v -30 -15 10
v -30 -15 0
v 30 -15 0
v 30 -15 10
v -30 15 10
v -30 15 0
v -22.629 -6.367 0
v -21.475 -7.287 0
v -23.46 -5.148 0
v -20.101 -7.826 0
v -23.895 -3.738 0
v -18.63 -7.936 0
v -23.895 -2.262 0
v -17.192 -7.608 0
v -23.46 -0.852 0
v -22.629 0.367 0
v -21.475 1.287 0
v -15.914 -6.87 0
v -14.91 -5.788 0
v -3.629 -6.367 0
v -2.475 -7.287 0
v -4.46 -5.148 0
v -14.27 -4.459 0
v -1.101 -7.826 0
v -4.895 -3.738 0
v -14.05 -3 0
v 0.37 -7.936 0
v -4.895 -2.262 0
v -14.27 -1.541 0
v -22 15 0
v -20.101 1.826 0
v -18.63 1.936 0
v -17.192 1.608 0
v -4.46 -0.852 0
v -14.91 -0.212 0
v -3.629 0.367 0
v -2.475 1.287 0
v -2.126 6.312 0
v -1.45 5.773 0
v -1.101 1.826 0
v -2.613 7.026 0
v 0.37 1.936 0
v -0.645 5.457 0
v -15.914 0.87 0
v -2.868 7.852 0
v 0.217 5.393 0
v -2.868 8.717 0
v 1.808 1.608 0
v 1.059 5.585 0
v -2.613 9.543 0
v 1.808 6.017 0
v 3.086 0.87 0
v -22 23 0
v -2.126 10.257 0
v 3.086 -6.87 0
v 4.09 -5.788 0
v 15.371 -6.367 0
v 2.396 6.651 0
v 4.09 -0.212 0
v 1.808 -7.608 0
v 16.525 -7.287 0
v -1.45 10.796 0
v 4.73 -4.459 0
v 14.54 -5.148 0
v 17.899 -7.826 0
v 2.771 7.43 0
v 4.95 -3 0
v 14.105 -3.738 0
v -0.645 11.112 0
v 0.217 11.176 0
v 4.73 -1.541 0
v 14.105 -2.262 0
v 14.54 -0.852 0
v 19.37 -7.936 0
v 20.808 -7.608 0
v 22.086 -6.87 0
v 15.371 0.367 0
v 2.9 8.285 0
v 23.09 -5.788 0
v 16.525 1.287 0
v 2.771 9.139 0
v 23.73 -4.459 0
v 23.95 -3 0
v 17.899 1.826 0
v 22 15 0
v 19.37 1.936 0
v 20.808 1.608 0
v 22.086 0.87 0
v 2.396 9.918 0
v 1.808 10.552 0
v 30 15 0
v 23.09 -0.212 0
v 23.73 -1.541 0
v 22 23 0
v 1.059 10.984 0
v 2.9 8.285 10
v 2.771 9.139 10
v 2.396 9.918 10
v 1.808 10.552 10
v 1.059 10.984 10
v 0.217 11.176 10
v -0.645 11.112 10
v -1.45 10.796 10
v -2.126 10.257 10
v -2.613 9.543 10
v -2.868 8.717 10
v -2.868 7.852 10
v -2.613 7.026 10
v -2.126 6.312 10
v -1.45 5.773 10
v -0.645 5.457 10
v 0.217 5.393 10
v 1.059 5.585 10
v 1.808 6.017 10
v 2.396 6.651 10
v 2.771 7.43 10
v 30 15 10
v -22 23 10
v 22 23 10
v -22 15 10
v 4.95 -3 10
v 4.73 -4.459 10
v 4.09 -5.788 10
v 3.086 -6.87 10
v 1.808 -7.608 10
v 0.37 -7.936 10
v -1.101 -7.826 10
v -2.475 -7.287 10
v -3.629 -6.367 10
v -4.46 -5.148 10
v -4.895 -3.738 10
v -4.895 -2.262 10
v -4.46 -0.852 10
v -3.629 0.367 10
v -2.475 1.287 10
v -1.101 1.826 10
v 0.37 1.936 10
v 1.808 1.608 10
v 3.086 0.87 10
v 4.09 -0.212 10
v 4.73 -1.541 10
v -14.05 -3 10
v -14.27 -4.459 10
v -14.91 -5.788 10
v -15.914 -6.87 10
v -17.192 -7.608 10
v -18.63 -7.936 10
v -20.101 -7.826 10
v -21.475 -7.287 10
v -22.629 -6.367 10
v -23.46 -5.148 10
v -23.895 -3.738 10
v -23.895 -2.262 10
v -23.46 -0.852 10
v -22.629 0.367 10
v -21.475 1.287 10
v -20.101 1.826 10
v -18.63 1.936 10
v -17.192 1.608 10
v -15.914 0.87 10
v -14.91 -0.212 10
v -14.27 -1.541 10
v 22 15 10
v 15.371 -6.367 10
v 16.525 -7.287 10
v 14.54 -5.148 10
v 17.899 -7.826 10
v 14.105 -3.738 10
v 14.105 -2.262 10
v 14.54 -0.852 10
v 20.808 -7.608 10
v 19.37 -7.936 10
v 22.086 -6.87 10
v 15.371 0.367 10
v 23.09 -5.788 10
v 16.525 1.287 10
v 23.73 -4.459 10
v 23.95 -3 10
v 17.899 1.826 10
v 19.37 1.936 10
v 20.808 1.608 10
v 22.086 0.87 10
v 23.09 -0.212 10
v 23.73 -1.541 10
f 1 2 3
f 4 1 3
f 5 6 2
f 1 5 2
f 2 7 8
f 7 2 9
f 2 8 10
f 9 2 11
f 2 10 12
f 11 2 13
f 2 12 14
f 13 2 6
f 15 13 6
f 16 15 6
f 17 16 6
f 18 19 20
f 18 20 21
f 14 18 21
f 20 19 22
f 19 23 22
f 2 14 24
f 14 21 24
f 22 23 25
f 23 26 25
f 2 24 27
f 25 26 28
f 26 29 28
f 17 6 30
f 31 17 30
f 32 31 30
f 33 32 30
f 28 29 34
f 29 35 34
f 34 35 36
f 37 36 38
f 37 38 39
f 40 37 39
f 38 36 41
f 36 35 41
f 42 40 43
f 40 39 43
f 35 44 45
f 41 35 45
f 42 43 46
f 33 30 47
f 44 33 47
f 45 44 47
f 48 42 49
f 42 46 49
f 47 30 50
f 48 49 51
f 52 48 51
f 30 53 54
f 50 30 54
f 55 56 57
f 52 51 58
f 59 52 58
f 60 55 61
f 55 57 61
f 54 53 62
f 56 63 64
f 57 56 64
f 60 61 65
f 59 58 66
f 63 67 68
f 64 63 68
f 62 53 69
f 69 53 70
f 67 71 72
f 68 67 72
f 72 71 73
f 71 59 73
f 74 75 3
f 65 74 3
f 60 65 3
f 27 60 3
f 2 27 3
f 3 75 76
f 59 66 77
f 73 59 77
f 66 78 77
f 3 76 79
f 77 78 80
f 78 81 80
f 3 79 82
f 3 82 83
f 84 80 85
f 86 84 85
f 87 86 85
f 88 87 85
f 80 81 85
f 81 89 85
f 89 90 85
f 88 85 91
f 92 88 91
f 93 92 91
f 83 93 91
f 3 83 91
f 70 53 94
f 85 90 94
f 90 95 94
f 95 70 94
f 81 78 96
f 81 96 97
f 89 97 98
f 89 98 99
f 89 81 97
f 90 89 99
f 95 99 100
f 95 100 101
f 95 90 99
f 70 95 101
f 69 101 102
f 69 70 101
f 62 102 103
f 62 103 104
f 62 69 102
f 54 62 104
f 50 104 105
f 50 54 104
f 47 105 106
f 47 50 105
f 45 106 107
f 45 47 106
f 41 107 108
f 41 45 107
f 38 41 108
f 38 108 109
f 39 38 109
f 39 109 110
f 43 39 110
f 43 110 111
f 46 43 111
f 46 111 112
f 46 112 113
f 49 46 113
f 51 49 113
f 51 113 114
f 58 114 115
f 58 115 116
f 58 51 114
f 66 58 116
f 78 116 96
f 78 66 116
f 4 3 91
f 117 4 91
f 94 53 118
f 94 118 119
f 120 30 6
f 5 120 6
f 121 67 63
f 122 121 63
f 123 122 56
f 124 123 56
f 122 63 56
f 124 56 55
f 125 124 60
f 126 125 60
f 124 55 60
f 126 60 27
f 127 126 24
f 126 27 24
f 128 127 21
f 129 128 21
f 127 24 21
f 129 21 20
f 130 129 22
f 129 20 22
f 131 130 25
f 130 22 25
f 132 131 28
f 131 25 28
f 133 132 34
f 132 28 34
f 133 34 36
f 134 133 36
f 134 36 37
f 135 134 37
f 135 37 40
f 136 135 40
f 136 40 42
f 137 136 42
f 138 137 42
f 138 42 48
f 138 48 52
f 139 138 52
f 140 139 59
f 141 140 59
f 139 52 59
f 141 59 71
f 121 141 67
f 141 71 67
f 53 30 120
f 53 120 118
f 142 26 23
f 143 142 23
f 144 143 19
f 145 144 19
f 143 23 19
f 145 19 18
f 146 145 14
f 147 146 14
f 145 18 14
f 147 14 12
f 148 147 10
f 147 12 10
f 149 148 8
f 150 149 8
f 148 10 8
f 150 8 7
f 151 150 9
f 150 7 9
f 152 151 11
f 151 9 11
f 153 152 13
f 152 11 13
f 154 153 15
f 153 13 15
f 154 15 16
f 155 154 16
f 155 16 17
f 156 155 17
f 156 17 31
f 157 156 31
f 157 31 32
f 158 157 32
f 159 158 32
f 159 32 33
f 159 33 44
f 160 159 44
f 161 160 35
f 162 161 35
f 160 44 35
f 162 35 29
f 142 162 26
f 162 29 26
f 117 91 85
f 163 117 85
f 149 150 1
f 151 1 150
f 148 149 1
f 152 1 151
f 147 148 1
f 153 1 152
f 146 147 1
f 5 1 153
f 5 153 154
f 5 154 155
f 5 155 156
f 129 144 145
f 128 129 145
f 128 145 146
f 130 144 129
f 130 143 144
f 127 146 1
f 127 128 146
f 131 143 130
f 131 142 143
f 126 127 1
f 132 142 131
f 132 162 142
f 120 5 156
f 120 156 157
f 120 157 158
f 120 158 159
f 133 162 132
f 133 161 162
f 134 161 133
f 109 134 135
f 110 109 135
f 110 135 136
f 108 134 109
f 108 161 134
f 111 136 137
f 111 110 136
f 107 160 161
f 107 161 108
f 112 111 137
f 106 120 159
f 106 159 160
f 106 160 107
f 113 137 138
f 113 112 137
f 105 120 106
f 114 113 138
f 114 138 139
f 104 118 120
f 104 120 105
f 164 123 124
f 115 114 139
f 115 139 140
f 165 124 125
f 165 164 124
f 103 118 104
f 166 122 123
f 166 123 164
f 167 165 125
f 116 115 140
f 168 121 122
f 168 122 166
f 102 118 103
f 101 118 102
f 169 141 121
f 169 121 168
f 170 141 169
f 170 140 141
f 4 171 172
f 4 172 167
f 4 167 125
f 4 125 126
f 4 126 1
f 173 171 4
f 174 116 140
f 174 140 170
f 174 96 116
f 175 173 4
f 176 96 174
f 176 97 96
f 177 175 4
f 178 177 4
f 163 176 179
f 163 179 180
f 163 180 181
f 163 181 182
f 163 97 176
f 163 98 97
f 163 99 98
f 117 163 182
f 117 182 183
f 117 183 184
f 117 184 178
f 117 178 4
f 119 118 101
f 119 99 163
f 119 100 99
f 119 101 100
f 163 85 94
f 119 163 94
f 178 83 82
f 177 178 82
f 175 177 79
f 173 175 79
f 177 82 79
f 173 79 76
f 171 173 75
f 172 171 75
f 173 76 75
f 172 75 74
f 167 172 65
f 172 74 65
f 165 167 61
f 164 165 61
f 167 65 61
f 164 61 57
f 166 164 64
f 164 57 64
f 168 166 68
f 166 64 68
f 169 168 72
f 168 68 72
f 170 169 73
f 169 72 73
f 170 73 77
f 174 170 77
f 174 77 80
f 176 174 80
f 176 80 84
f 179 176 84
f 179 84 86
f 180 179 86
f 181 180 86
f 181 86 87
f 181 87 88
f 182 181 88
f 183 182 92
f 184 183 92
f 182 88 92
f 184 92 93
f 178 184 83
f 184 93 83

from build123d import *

# Parameters (mm, degrees)
F0_R     = 2.9
F0_W     = 44
F0_H     = 8
F1_DEPTH = 10


with BuildPart() as f1:
    # F0 (on Top) → F1 (new body)
    with BuildSketch(Plane.XY):
        with BuildLine():
            Line((23.95, -3), (30, -3))
            Line((30, -3), (30, 15))
            Line((30, 15), (22, 15))
            Line((22, 15), (-22, 15))
            Line((-22, 15), (-30, 15))
            Line((-30, 15), (-30, -3))
            Line((-30, -3), (-23.95, -3))
            ThreePointArc((-23.95, -3), (-19, 1.95), (-14.05, -3))
            Line((-14.05, -3), (-4.95, -3))
            ThreePointArc((-4.95, -3), (0, 1.95), (4.95, -3))
            Line((4.95, -3), (14.05, -3))
            ThreePointArc((14.05, -3), (19, 1.95), (23.95, -3))
        make_face()
        with Locations((0, 8.284595)):
            Circle(F0_R, mode=Mode.SUBTRACT)
        with BuildLine():
            Line((-30, -15), (30, -15))
            Line((30, -15), (30, -3))
            Line((30, -3), (23.95, -3))
            ThreePointArc((23.95, -3), (19, -7.95), (14.05, -3))
            Line((14.05, -3), (4.95, -3))
            ThreePointArc((4.95, -3), (0, -7.95), (-4.95, -3))
            Line((-4.95, -3), (-14.05, -3))
            ThreePointArc((-14.05, -3), (-19, -7.95), (-23.95, -3))
            Line((-23.95, -3), (-30, -3))
            Line((-30, -3), (-30, -15))
        make_face()
        with Locations((0, 19)):
            Rectangle(F0_W, F0_H)
    extrude(amount=F1_DEPTH)


solid = f1.part
